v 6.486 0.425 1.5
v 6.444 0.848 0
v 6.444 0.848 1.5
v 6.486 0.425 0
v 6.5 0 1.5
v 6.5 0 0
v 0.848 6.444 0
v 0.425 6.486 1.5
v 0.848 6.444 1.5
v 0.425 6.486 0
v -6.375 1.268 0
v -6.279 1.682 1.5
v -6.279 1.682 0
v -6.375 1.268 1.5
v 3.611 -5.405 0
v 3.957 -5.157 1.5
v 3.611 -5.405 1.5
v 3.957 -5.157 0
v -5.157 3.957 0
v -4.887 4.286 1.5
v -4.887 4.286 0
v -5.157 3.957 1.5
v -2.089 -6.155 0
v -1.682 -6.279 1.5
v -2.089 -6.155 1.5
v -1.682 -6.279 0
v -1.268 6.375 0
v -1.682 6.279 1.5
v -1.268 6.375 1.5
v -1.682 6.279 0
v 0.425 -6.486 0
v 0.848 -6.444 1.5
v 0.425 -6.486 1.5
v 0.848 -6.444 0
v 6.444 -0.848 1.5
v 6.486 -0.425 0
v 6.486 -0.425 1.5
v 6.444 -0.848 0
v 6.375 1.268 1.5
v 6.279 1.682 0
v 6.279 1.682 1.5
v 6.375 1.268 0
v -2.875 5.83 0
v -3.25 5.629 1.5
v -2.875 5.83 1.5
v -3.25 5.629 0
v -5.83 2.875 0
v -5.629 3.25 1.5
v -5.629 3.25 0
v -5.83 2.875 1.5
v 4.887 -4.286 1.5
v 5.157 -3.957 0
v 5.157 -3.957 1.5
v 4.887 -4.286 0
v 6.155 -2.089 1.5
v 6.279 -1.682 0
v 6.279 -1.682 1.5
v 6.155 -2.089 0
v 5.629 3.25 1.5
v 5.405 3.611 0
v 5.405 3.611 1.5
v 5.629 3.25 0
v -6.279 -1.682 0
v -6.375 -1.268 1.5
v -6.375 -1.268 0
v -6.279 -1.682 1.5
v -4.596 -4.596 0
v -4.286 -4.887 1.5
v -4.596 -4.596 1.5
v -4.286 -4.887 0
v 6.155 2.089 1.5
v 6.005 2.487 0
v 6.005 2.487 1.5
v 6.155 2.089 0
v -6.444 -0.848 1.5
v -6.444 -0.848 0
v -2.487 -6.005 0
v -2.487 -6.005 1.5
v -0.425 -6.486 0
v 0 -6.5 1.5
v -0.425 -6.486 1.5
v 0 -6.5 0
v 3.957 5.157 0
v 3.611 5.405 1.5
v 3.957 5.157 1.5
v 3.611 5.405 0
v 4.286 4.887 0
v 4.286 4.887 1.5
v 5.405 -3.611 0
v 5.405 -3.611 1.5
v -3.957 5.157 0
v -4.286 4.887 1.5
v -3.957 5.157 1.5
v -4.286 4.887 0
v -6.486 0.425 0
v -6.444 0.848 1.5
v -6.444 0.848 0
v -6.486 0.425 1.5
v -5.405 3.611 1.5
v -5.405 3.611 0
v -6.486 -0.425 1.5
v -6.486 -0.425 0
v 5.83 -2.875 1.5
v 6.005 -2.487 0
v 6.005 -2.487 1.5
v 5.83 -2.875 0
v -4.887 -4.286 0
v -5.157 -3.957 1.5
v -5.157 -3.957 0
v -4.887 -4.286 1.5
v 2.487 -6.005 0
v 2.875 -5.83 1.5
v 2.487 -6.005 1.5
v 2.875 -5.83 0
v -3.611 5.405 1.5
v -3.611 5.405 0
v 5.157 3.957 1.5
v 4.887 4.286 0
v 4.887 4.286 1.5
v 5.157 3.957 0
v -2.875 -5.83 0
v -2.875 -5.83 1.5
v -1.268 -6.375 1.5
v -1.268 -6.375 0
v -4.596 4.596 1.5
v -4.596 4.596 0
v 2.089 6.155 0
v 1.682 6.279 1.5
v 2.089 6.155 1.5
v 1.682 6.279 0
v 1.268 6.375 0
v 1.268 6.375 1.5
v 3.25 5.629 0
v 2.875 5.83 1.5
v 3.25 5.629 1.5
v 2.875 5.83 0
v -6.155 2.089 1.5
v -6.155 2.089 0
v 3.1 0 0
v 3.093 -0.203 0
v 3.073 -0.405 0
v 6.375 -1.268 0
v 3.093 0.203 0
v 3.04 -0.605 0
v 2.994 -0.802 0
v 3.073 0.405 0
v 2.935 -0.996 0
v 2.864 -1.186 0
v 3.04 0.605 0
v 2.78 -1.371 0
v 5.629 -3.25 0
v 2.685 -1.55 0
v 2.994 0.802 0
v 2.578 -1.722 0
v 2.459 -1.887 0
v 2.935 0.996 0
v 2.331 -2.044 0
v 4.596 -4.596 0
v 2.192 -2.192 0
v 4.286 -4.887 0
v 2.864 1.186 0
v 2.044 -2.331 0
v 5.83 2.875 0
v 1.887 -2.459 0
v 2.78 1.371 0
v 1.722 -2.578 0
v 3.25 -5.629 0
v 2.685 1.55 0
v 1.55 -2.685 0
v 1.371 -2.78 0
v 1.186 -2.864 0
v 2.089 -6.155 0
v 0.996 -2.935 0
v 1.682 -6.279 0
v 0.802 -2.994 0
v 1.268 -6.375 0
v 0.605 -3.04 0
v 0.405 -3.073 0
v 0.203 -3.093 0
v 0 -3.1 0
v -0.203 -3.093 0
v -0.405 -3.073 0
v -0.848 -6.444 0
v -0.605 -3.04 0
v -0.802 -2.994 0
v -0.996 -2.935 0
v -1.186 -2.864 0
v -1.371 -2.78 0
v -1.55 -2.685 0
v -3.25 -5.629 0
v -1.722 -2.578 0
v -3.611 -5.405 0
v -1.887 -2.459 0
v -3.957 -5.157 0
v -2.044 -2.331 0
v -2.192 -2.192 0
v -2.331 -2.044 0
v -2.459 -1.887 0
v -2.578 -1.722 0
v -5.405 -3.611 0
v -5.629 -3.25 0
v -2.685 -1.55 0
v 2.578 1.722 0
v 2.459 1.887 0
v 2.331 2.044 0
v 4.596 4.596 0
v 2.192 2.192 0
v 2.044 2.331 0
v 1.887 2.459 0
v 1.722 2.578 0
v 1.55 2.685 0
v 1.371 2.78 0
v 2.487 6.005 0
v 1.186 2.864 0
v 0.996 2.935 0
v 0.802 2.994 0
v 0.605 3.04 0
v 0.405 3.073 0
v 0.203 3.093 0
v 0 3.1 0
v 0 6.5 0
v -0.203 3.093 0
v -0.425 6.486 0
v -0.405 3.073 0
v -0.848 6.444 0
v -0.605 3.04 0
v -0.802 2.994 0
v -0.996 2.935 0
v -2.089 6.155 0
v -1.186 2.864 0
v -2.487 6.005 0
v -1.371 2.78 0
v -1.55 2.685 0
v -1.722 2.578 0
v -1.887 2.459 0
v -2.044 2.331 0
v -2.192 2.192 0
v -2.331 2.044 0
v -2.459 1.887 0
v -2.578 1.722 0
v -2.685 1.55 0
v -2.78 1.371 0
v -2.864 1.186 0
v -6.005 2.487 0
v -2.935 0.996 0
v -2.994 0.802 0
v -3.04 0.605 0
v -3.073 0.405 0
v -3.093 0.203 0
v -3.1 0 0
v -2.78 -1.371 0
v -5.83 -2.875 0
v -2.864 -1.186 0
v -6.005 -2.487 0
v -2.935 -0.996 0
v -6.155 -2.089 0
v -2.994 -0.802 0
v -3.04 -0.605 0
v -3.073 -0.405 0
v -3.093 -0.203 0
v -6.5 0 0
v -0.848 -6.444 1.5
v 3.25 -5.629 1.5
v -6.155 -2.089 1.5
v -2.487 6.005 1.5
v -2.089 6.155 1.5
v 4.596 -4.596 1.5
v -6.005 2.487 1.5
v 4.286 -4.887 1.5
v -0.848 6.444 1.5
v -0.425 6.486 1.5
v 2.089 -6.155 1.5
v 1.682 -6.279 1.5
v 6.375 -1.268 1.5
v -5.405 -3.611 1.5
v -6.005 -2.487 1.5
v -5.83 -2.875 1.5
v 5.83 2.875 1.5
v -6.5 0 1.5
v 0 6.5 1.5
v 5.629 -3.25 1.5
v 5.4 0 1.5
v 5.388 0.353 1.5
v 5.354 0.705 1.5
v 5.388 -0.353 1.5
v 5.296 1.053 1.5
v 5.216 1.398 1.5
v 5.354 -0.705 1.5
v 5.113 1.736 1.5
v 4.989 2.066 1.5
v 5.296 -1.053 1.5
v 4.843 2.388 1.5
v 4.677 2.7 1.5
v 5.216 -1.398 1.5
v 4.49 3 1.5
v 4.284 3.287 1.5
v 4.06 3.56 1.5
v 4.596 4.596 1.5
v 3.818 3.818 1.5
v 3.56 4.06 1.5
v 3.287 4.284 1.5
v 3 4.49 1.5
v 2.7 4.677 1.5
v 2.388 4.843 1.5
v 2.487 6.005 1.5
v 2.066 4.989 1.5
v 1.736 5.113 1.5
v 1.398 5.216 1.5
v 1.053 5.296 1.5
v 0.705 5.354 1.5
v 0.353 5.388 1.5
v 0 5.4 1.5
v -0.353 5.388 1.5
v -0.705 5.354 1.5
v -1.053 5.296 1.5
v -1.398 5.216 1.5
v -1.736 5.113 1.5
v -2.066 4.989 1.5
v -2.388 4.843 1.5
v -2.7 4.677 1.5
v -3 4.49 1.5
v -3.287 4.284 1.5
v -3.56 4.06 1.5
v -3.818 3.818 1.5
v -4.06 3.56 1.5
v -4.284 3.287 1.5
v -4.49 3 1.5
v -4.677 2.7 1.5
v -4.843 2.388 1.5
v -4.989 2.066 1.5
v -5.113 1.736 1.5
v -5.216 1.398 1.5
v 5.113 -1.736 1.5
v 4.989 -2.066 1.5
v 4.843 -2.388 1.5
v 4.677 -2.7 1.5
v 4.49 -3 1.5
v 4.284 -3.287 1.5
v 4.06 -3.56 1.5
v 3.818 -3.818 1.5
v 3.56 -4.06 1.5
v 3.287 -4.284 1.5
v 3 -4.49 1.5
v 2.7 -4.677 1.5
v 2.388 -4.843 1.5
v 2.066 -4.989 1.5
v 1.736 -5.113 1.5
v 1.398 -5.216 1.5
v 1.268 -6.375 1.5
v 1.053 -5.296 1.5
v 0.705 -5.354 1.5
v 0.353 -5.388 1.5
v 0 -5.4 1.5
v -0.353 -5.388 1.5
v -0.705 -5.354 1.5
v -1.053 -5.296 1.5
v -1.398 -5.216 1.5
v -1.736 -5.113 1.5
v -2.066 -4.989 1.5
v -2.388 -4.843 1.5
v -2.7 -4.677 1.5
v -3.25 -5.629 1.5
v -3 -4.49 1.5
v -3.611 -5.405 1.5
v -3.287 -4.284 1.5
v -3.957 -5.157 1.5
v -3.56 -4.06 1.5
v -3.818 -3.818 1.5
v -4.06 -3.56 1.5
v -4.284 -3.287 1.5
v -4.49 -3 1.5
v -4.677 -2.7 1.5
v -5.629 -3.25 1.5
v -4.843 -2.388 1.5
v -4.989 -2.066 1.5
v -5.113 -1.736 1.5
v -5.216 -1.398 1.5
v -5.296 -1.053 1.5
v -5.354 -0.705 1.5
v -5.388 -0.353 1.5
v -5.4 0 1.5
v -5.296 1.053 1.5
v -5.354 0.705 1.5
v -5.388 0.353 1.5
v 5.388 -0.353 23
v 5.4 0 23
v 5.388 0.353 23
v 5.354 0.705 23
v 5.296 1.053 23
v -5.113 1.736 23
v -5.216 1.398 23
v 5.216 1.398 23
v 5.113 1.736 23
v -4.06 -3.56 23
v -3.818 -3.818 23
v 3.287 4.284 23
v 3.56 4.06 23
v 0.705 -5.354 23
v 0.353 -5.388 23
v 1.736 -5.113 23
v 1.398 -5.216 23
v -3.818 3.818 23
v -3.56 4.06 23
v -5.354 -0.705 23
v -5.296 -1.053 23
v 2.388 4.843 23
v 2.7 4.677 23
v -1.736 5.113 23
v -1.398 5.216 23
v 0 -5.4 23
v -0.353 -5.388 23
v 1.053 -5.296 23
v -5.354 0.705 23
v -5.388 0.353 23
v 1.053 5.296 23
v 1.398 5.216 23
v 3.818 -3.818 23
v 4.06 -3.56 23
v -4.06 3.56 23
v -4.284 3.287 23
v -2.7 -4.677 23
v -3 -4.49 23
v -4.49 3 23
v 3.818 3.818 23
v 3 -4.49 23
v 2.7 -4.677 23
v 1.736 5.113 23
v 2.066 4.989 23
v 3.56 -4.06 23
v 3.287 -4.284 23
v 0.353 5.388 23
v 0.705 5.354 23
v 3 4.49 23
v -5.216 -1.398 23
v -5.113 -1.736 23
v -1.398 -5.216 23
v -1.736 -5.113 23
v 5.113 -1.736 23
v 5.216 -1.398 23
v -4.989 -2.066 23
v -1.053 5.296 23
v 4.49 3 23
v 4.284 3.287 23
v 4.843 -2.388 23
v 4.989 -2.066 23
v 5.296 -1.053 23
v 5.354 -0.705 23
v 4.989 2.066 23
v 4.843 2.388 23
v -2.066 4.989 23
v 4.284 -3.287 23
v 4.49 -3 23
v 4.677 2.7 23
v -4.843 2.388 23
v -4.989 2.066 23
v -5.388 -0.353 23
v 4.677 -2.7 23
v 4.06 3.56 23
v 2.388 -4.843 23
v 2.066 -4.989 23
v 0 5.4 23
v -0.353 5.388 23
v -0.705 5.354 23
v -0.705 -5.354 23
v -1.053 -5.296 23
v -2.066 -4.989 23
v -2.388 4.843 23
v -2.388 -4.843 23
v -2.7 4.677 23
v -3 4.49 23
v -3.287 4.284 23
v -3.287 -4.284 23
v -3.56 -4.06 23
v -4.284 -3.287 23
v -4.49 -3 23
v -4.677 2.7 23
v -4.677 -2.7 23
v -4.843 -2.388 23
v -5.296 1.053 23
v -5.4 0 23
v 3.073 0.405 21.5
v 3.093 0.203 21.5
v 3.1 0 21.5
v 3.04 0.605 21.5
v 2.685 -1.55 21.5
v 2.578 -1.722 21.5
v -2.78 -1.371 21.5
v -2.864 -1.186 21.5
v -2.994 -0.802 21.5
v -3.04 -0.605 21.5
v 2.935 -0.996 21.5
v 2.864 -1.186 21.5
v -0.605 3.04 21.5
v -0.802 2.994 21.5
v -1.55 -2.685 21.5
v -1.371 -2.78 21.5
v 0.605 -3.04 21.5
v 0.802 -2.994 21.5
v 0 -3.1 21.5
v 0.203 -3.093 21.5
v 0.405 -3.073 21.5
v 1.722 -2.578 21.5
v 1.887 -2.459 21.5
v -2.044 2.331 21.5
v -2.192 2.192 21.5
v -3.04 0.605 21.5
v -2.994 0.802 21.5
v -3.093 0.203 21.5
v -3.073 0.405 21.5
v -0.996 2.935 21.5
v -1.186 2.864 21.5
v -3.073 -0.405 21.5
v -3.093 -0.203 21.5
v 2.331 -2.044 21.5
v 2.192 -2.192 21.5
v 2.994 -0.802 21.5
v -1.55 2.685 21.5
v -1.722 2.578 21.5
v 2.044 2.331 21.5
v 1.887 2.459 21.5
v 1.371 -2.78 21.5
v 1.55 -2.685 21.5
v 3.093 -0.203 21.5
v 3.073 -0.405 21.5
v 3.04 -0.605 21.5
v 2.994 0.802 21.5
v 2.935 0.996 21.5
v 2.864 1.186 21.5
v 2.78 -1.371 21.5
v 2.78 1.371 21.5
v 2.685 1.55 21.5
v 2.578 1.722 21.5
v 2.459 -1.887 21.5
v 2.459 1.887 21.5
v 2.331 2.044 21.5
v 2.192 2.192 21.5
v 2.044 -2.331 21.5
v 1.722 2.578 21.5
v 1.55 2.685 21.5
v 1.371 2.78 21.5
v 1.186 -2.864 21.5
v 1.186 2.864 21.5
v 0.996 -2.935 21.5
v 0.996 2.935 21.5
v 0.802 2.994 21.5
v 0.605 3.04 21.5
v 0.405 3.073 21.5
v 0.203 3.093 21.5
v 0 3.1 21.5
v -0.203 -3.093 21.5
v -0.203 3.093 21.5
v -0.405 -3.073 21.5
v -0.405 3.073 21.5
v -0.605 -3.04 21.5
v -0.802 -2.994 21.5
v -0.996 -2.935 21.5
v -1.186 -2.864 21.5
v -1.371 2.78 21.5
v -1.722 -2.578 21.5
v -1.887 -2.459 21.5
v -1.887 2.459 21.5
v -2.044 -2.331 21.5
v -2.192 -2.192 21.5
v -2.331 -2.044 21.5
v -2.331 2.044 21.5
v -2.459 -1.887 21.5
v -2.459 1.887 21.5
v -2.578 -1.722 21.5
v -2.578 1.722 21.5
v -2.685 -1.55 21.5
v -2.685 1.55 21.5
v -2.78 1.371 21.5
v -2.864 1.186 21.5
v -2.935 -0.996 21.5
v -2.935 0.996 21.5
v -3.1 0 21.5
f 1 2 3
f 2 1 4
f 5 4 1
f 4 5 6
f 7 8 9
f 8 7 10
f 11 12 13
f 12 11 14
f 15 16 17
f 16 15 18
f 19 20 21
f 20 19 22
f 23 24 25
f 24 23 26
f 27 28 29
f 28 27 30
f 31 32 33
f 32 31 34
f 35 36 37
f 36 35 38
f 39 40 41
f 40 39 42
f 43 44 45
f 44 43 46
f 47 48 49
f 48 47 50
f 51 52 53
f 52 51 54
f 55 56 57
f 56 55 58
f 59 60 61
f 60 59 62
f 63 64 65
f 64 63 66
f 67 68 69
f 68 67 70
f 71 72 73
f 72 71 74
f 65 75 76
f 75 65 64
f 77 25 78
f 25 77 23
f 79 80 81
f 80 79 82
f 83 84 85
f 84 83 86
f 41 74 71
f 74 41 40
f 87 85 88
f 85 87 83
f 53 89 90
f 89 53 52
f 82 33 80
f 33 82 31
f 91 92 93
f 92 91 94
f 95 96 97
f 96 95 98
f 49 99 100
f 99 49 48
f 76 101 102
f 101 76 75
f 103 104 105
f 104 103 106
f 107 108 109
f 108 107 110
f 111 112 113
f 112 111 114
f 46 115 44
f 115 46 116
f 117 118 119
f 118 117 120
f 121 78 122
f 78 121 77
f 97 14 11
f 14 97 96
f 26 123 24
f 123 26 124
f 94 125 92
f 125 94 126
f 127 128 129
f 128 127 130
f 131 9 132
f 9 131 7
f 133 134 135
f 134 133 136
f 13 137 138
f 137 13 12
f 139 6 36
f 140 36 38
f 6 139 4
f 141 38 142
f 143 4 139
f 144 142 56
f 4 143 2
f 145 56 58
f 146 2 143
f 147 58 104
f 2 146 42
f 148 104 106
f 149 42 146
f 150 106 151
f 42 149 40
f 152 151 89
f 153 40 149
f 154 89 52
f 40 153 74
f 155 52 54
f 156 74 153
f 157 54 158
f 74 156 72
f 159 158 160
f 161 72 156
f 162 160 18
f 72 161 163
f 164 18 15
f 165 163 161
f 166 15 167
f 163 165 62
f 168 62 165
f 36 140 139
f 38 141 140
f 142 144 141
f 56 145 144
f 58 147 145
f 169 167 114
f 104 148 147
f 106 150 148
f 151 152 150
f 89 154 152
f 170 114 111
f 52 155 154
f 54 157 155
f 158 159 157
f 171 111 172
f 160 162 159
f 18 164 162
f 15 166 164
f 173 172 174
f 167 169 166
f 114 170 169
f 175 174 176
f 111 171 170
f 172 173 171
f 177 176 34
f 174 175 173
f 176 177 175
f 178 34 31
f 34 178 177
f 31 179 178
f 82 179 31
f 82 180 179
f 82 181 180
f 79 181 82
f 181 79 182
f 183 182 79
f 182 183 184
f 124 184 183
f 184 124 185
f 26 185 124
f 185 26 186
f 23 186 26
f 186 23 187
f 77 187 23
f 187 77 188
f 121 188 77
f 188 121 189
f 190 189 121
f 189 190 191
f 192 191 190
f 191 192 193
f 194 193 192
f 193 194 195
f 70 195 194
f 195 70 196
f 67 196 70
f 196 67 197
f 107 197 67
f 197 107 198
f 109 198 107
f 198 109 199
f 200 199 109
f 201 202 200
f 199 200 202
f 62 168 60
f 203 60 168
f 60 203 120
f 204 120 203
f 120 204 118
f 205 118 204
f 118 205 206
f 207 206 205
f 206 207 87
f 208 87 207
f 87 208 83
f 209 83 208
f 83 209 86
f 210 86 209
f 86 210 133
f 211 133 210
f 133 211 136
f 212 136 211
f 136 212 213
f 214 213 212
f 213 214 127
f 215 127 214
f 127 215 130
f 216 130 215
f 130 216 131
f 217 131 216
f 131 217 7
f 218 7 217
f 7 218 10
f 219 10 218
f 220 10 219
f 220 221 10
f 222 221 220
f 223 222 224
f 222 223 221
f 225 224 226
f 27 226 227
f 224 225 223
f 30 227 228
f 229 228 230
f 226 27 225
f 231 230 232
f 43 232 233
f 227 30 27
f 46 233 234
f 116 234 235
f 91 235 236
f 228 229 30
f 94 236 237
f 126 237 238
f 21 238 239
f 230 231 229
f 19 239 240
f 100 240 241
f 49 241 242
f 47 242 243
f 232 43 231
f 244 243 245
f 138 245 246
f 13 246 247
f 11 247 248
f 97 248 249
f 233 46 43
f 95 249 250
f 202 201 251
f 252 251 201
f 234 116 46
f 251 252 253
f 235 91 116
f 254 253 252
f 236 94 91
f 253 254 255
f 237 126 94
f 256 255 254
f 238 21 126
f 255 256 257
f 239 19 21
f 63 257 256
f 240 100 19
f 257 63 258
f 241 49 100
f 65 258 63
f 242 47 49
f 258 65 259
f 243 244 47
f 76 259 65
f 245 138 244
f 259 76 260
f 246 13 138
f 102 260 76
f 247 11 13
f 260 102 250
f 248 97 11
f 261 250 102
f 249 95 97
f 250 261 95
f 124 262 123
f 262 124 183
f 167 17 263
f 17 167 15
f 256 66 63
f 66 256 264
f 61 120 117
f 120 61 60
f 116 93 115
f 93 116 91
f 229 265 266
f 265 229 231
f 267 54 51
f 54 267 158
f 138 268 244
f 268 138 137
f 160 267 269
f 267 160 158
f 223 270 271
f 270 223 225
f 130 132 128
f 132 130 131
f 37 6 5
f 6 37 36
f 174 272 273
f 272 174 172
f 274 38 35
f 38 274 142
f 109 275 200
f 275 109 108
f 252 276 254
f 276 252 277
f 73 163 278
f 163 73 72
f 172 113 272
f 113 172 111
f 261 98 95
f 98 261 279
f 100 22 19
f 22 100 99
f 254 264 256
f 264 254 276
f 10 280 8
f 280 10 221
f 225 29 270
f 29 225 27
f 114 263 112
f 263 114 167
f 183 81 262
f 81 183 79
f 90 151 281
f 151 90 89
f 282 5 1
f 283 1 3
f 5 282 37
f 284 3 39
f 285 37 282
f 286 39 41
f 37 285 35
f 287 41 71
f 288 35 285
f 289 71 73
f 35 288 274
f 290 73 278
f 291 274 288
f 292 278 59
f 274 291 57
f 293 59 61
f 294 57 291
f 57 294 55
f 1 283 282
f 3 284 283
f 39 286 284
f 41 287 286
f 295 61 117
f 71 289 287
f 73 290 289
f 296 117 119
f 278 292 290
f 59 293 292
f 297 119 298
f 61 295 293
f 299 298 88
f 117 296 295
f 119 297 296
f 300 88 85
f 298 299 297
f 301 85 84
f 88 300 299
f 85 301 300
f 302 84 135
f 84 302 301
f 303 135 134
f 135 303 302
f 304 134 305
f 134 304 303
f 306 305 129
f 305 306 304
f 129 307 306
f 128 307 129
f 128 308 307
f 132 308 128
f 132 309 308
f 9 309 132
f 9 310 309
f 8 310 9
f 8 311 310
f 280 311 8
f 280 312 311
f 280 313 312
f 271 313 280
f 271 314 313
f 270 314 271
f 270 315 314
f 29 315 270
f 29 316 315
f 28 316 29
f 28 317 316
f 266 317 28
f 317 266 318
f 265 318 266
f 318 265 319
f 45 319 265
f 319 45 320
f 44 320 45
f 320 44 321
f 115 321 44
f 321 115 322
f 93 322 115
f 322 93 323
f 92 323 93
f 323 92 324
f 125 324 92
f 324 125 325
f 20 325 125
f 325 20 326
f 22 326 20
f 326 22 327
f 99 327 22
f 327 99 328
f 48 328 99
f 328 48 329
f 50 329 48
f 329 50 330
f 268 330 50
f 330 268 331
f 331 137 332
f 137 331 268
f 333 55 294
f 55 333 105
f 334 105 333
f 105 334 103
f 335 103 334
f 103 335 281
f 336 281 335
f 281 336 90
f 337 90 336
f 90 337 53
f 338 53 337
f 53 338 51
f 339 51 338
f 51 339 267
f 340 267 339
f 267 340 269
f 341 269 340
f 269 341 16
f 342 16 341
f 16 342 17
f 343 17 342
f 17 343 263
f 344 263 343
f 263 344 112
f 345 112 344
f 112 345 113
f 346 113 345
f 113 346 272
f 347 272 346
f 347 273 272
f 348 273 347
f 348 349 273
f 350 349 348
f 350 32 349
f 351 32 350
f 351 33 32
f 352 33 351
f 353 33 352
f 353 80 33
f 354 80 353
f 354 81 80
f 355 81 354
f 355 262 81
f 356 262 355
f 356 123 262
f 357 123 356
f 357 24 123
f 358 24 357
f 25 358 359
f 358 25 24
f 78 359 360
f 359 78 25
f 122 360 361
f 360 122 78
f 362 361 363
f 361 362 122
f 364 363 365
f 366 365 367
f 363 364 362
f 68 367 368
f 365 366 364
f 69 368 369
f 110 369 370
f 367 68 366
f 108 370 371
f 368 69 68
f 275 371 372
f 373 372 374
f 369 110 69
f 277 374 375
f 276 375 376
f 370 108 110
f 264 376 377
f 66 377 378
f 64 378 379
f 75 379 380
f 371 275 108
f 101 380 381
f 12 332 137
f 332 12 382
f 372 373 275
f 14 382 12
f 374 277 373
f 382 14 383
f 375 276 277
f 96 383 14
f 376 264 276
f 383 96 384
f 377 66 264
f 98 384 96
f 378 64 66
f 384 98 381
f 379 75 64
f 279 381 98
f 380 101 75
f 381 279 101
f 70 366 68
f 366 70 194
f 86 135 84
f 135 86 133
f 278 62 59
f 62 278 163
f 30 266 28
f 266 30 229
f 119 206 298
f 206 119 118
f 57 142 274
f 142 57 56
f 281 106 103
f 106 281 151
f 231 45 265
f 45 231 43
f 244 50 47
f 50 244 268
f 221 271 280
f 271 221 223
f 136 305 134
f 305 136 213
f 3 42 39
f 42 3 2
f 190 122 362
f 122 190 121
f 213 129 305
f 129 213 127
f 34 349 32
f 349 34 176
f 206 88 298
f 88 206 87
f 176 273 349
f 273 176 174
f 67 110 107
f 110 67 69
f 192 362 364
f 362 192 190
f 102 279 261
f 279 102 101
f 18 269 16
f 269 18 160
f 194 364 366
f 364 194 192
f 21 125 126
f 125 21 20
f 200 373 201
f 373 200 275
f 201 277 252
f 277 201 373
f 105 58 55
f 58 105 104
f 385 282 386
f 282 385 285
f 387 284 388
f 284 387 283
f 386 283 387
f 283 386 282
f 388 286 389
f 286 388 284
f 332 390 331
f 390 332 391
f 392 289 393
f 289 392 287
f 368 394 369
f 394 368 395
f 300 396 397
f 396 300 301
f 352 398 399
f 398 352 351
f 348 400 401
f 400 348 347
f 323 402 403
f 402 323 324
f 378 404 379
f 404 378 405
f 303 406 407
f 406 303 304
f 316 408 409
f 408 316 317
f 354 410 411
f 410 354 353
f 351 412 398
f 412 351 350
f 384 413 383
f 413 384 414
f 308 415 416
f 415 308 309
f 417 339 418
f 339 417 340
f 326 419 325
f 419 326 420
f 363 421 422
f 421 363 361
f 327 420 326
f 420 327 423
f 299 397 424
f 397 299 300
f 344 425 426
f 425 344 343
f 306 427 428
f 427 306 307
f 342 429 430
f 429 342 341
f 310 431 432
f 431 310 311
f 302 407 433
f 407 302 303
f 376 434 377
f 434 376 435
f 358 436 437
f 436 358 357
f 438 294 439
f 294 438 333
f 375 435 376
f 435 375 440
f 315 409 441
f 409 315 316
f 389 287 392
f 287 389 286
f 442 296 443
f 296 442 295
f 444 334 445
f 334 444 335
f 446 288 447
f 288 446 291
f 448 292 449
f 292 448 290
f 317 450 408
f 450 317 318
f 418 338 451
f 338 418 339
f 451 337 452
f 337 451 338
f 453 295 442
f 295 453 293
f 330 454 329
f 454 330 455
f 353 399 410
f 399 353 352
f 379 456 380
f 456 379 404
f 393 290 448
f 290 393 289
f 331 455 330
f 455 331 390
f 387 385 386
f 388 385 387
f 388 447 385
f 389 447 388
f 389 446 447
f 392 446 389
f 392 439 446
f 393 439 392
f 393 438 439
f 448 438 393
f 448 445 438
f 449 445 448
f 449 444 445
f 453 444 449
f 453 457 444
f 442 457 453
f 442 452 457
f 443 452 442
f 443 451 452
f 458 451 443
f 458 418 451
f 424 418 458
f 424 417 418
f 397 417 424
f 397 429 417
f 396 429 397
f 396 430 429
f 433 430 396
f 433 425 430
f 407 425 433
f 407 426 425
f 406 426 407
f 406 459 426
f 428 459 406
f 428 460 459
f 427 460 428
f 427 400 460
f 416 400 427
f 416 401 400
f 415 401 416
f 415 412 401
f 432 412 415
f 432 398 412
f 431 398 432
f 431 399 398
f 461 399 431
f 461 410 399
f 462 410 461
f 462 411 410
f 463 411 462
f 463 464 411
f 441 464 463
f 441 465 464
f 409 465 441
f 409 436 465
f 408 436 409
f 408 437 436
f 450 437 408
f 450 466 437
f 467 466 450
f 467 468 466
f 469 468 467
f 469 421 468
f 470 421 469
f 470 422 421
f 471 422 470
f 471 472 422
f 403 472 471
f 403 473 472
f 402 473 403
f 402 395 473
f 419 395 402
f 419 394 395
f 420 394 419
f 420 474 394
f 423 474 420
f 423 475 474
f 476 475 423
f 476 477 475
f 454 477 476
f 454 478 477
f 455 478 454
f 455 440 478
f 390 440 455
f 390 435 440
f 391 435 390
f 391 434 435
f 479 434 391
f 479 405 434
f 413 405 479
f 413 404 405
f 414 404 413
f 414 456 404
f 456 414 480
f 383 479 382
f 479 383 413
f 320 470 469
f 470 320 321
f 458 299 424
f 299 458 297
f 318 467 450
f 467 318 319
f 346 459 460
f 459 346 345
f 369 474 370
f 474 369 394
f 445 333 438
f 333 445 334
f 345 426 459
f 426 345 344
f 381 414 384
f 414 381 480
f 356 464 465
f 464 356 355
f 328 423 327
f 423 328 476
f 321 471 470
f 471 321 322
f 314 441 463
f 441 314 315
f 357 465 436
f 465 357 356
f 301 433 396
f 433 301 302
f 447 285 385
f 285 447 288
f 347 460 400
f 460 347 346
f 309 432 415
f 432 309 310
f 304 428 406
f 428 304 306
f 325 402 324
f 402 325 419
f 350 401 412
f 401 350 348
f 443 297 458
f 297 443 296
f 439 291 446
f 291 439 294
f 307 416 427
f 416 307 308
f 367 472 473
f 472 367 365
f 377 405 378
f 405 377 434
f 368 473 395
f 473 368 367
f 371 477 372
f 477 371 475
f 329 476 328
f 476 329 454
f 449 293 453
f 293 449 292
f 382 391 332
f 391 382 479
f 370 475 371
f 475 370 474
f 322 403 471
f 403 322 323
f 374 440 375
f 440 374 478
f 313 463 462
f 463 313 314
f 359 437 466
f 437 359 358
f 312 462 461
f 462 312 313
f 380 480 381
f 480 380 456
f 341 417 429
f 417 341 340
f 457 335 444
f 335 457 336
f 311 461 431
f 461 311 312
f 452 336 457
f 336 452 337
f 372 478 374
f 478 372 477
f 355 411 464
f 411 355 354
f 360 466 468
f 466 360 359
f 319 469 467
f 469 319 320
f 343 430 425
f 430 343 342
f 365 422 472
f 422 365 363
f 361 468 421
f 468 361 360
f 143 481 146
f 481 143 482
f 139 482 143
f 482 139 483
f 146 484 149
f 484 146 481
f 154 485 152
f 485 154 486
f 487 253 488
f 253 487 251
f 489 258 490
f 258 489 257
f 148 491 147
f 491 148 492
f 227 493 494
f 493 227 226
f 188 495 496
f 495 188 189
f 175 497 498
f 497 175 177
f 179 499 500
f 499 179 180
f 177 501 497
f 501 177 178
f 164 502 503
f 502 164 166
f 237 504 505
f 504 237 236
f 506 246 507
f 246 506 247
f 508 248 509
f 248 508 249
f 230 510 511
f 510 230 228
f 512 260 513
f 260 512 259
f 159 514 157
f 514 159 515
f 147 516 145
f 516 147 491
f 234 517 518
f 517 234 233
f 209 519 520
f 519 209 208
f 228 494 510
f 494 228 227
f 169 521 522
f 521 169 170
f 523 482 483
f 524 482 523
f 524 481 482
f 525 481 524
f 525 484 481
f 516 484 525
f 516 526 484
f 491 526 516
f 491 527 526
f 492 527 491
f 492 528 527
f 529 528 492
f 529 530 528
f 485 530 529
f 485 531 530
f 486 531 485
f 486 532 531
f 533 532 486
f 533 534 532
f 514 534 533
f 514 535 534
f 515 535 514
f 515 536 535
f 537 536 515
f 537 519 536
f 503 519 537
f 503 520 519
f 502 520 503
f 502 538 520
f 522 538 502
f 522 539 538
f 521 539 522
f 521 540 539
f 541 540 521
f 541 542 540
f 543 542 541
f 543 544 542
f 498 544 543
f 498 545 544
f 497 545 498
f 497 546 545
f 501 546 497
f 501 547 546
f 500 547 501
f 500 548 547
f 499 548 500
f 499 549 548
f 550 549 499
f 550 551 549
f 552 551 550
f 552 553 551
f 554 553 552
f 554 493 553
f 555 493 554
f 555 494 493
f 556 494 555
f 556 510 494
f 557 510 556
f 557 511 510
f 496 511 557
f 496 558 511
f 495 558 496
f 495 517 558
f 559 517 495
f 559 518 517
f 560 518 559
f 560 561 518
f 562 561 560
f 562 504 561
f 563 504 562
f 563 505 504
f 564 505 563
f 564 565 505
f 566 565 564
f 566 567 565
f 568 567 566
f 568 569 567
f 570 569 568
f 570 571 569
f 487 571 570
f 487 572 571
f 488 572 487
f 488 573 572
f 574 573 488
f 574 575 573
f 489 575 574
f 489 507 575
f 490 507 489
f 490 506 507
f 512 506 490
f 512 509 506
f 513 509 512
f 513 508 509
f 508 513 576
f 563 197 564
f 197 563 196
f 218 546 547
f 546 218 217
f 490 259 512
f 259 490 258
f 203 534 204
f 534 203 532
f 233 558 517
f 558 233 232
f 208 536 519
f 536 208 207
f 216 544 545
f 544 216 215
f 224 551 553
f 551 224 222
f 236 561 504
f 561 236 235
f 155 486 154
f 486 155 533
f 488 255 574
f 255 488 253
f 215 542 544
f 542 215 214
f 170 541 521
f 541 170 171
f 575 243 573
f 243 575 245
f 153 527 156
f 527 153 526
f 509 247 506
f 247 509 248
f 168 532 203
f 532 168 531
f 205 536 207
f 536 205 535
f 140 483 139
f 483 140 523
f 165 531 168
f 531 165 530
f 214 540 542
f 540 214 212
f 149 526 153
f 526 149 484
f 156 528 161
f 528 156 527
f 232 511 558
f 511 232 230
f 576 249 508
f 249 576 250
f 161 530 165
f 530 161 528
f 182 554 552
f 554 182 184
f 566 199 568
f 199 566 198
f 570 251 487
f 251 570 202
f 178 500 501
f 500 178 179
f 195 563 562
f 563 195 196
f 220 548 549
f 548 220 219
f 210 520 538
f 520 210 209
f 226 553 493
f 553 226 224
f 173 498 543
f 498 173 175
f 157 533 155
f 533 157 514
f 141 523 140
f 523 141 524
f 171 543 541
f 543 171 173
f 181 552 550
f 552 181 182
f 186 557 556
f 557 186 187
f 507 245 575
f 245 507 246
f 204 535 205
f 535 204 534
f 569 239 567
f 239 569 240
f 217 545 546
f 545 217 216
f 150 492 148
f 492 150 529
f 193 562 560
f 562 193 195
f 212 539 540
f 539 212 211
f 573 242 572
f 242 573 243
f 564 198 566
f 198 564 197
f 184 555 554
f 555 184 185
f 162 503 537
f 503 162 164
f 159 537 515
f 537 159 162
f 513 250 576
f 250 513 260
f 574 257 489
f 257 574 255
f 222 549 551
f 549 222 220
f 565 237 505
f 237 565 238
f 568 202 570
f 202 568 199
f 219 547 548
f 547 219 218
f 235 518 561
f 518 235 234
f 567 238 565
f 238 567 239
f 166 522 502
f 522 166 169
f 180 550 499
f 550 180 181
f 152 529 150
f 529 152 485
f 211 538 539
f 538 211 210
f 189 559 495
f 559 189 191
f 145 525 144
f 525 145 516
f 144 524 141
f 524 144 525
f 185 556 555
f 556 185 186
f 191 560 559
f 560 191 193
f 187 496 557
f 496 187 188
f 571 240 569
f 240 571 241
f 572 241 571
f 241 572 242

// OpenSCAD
// Adapter sleeve: 0.2 mL PCR tube in a 1.5 mL tube rack hole
// Print orientation: collar on the bed (z = 0), sleeve body builds upward.

$fn = 96;

// ---- Dimensions (mm) ----
collar_d      = 13;    // collar outer diameter
collar_h      = 1.5;   // collar thickness (z = 0 to 1.5)
sleeve_od     = 10.8;  // sleeve body outer diameter
sleeve_top_z  = 21.5;  // top of sleeve body (z)
bore_d        = 6.2;   // through-bore diameter
eps           = 0.5;   // cutter overshoot past faces

total_h = sleeve_top_z + eps;  // full height for the through-bore

difference() {
    union() {
        // Collar
        cylinder(d = collar_d, h = collar_h);
        // Sleeve body (slightly overlaps collar for a clean union)
        translate([0, 0, collar_h - 0.01])
            cylinder(d = sleeve_od, h = sleeve_top_z + 0.01);
    }
    // Straight through-bore
    translate([0, 0, -eps])
        cylinder(d = bore_d, h = total_h);
}
